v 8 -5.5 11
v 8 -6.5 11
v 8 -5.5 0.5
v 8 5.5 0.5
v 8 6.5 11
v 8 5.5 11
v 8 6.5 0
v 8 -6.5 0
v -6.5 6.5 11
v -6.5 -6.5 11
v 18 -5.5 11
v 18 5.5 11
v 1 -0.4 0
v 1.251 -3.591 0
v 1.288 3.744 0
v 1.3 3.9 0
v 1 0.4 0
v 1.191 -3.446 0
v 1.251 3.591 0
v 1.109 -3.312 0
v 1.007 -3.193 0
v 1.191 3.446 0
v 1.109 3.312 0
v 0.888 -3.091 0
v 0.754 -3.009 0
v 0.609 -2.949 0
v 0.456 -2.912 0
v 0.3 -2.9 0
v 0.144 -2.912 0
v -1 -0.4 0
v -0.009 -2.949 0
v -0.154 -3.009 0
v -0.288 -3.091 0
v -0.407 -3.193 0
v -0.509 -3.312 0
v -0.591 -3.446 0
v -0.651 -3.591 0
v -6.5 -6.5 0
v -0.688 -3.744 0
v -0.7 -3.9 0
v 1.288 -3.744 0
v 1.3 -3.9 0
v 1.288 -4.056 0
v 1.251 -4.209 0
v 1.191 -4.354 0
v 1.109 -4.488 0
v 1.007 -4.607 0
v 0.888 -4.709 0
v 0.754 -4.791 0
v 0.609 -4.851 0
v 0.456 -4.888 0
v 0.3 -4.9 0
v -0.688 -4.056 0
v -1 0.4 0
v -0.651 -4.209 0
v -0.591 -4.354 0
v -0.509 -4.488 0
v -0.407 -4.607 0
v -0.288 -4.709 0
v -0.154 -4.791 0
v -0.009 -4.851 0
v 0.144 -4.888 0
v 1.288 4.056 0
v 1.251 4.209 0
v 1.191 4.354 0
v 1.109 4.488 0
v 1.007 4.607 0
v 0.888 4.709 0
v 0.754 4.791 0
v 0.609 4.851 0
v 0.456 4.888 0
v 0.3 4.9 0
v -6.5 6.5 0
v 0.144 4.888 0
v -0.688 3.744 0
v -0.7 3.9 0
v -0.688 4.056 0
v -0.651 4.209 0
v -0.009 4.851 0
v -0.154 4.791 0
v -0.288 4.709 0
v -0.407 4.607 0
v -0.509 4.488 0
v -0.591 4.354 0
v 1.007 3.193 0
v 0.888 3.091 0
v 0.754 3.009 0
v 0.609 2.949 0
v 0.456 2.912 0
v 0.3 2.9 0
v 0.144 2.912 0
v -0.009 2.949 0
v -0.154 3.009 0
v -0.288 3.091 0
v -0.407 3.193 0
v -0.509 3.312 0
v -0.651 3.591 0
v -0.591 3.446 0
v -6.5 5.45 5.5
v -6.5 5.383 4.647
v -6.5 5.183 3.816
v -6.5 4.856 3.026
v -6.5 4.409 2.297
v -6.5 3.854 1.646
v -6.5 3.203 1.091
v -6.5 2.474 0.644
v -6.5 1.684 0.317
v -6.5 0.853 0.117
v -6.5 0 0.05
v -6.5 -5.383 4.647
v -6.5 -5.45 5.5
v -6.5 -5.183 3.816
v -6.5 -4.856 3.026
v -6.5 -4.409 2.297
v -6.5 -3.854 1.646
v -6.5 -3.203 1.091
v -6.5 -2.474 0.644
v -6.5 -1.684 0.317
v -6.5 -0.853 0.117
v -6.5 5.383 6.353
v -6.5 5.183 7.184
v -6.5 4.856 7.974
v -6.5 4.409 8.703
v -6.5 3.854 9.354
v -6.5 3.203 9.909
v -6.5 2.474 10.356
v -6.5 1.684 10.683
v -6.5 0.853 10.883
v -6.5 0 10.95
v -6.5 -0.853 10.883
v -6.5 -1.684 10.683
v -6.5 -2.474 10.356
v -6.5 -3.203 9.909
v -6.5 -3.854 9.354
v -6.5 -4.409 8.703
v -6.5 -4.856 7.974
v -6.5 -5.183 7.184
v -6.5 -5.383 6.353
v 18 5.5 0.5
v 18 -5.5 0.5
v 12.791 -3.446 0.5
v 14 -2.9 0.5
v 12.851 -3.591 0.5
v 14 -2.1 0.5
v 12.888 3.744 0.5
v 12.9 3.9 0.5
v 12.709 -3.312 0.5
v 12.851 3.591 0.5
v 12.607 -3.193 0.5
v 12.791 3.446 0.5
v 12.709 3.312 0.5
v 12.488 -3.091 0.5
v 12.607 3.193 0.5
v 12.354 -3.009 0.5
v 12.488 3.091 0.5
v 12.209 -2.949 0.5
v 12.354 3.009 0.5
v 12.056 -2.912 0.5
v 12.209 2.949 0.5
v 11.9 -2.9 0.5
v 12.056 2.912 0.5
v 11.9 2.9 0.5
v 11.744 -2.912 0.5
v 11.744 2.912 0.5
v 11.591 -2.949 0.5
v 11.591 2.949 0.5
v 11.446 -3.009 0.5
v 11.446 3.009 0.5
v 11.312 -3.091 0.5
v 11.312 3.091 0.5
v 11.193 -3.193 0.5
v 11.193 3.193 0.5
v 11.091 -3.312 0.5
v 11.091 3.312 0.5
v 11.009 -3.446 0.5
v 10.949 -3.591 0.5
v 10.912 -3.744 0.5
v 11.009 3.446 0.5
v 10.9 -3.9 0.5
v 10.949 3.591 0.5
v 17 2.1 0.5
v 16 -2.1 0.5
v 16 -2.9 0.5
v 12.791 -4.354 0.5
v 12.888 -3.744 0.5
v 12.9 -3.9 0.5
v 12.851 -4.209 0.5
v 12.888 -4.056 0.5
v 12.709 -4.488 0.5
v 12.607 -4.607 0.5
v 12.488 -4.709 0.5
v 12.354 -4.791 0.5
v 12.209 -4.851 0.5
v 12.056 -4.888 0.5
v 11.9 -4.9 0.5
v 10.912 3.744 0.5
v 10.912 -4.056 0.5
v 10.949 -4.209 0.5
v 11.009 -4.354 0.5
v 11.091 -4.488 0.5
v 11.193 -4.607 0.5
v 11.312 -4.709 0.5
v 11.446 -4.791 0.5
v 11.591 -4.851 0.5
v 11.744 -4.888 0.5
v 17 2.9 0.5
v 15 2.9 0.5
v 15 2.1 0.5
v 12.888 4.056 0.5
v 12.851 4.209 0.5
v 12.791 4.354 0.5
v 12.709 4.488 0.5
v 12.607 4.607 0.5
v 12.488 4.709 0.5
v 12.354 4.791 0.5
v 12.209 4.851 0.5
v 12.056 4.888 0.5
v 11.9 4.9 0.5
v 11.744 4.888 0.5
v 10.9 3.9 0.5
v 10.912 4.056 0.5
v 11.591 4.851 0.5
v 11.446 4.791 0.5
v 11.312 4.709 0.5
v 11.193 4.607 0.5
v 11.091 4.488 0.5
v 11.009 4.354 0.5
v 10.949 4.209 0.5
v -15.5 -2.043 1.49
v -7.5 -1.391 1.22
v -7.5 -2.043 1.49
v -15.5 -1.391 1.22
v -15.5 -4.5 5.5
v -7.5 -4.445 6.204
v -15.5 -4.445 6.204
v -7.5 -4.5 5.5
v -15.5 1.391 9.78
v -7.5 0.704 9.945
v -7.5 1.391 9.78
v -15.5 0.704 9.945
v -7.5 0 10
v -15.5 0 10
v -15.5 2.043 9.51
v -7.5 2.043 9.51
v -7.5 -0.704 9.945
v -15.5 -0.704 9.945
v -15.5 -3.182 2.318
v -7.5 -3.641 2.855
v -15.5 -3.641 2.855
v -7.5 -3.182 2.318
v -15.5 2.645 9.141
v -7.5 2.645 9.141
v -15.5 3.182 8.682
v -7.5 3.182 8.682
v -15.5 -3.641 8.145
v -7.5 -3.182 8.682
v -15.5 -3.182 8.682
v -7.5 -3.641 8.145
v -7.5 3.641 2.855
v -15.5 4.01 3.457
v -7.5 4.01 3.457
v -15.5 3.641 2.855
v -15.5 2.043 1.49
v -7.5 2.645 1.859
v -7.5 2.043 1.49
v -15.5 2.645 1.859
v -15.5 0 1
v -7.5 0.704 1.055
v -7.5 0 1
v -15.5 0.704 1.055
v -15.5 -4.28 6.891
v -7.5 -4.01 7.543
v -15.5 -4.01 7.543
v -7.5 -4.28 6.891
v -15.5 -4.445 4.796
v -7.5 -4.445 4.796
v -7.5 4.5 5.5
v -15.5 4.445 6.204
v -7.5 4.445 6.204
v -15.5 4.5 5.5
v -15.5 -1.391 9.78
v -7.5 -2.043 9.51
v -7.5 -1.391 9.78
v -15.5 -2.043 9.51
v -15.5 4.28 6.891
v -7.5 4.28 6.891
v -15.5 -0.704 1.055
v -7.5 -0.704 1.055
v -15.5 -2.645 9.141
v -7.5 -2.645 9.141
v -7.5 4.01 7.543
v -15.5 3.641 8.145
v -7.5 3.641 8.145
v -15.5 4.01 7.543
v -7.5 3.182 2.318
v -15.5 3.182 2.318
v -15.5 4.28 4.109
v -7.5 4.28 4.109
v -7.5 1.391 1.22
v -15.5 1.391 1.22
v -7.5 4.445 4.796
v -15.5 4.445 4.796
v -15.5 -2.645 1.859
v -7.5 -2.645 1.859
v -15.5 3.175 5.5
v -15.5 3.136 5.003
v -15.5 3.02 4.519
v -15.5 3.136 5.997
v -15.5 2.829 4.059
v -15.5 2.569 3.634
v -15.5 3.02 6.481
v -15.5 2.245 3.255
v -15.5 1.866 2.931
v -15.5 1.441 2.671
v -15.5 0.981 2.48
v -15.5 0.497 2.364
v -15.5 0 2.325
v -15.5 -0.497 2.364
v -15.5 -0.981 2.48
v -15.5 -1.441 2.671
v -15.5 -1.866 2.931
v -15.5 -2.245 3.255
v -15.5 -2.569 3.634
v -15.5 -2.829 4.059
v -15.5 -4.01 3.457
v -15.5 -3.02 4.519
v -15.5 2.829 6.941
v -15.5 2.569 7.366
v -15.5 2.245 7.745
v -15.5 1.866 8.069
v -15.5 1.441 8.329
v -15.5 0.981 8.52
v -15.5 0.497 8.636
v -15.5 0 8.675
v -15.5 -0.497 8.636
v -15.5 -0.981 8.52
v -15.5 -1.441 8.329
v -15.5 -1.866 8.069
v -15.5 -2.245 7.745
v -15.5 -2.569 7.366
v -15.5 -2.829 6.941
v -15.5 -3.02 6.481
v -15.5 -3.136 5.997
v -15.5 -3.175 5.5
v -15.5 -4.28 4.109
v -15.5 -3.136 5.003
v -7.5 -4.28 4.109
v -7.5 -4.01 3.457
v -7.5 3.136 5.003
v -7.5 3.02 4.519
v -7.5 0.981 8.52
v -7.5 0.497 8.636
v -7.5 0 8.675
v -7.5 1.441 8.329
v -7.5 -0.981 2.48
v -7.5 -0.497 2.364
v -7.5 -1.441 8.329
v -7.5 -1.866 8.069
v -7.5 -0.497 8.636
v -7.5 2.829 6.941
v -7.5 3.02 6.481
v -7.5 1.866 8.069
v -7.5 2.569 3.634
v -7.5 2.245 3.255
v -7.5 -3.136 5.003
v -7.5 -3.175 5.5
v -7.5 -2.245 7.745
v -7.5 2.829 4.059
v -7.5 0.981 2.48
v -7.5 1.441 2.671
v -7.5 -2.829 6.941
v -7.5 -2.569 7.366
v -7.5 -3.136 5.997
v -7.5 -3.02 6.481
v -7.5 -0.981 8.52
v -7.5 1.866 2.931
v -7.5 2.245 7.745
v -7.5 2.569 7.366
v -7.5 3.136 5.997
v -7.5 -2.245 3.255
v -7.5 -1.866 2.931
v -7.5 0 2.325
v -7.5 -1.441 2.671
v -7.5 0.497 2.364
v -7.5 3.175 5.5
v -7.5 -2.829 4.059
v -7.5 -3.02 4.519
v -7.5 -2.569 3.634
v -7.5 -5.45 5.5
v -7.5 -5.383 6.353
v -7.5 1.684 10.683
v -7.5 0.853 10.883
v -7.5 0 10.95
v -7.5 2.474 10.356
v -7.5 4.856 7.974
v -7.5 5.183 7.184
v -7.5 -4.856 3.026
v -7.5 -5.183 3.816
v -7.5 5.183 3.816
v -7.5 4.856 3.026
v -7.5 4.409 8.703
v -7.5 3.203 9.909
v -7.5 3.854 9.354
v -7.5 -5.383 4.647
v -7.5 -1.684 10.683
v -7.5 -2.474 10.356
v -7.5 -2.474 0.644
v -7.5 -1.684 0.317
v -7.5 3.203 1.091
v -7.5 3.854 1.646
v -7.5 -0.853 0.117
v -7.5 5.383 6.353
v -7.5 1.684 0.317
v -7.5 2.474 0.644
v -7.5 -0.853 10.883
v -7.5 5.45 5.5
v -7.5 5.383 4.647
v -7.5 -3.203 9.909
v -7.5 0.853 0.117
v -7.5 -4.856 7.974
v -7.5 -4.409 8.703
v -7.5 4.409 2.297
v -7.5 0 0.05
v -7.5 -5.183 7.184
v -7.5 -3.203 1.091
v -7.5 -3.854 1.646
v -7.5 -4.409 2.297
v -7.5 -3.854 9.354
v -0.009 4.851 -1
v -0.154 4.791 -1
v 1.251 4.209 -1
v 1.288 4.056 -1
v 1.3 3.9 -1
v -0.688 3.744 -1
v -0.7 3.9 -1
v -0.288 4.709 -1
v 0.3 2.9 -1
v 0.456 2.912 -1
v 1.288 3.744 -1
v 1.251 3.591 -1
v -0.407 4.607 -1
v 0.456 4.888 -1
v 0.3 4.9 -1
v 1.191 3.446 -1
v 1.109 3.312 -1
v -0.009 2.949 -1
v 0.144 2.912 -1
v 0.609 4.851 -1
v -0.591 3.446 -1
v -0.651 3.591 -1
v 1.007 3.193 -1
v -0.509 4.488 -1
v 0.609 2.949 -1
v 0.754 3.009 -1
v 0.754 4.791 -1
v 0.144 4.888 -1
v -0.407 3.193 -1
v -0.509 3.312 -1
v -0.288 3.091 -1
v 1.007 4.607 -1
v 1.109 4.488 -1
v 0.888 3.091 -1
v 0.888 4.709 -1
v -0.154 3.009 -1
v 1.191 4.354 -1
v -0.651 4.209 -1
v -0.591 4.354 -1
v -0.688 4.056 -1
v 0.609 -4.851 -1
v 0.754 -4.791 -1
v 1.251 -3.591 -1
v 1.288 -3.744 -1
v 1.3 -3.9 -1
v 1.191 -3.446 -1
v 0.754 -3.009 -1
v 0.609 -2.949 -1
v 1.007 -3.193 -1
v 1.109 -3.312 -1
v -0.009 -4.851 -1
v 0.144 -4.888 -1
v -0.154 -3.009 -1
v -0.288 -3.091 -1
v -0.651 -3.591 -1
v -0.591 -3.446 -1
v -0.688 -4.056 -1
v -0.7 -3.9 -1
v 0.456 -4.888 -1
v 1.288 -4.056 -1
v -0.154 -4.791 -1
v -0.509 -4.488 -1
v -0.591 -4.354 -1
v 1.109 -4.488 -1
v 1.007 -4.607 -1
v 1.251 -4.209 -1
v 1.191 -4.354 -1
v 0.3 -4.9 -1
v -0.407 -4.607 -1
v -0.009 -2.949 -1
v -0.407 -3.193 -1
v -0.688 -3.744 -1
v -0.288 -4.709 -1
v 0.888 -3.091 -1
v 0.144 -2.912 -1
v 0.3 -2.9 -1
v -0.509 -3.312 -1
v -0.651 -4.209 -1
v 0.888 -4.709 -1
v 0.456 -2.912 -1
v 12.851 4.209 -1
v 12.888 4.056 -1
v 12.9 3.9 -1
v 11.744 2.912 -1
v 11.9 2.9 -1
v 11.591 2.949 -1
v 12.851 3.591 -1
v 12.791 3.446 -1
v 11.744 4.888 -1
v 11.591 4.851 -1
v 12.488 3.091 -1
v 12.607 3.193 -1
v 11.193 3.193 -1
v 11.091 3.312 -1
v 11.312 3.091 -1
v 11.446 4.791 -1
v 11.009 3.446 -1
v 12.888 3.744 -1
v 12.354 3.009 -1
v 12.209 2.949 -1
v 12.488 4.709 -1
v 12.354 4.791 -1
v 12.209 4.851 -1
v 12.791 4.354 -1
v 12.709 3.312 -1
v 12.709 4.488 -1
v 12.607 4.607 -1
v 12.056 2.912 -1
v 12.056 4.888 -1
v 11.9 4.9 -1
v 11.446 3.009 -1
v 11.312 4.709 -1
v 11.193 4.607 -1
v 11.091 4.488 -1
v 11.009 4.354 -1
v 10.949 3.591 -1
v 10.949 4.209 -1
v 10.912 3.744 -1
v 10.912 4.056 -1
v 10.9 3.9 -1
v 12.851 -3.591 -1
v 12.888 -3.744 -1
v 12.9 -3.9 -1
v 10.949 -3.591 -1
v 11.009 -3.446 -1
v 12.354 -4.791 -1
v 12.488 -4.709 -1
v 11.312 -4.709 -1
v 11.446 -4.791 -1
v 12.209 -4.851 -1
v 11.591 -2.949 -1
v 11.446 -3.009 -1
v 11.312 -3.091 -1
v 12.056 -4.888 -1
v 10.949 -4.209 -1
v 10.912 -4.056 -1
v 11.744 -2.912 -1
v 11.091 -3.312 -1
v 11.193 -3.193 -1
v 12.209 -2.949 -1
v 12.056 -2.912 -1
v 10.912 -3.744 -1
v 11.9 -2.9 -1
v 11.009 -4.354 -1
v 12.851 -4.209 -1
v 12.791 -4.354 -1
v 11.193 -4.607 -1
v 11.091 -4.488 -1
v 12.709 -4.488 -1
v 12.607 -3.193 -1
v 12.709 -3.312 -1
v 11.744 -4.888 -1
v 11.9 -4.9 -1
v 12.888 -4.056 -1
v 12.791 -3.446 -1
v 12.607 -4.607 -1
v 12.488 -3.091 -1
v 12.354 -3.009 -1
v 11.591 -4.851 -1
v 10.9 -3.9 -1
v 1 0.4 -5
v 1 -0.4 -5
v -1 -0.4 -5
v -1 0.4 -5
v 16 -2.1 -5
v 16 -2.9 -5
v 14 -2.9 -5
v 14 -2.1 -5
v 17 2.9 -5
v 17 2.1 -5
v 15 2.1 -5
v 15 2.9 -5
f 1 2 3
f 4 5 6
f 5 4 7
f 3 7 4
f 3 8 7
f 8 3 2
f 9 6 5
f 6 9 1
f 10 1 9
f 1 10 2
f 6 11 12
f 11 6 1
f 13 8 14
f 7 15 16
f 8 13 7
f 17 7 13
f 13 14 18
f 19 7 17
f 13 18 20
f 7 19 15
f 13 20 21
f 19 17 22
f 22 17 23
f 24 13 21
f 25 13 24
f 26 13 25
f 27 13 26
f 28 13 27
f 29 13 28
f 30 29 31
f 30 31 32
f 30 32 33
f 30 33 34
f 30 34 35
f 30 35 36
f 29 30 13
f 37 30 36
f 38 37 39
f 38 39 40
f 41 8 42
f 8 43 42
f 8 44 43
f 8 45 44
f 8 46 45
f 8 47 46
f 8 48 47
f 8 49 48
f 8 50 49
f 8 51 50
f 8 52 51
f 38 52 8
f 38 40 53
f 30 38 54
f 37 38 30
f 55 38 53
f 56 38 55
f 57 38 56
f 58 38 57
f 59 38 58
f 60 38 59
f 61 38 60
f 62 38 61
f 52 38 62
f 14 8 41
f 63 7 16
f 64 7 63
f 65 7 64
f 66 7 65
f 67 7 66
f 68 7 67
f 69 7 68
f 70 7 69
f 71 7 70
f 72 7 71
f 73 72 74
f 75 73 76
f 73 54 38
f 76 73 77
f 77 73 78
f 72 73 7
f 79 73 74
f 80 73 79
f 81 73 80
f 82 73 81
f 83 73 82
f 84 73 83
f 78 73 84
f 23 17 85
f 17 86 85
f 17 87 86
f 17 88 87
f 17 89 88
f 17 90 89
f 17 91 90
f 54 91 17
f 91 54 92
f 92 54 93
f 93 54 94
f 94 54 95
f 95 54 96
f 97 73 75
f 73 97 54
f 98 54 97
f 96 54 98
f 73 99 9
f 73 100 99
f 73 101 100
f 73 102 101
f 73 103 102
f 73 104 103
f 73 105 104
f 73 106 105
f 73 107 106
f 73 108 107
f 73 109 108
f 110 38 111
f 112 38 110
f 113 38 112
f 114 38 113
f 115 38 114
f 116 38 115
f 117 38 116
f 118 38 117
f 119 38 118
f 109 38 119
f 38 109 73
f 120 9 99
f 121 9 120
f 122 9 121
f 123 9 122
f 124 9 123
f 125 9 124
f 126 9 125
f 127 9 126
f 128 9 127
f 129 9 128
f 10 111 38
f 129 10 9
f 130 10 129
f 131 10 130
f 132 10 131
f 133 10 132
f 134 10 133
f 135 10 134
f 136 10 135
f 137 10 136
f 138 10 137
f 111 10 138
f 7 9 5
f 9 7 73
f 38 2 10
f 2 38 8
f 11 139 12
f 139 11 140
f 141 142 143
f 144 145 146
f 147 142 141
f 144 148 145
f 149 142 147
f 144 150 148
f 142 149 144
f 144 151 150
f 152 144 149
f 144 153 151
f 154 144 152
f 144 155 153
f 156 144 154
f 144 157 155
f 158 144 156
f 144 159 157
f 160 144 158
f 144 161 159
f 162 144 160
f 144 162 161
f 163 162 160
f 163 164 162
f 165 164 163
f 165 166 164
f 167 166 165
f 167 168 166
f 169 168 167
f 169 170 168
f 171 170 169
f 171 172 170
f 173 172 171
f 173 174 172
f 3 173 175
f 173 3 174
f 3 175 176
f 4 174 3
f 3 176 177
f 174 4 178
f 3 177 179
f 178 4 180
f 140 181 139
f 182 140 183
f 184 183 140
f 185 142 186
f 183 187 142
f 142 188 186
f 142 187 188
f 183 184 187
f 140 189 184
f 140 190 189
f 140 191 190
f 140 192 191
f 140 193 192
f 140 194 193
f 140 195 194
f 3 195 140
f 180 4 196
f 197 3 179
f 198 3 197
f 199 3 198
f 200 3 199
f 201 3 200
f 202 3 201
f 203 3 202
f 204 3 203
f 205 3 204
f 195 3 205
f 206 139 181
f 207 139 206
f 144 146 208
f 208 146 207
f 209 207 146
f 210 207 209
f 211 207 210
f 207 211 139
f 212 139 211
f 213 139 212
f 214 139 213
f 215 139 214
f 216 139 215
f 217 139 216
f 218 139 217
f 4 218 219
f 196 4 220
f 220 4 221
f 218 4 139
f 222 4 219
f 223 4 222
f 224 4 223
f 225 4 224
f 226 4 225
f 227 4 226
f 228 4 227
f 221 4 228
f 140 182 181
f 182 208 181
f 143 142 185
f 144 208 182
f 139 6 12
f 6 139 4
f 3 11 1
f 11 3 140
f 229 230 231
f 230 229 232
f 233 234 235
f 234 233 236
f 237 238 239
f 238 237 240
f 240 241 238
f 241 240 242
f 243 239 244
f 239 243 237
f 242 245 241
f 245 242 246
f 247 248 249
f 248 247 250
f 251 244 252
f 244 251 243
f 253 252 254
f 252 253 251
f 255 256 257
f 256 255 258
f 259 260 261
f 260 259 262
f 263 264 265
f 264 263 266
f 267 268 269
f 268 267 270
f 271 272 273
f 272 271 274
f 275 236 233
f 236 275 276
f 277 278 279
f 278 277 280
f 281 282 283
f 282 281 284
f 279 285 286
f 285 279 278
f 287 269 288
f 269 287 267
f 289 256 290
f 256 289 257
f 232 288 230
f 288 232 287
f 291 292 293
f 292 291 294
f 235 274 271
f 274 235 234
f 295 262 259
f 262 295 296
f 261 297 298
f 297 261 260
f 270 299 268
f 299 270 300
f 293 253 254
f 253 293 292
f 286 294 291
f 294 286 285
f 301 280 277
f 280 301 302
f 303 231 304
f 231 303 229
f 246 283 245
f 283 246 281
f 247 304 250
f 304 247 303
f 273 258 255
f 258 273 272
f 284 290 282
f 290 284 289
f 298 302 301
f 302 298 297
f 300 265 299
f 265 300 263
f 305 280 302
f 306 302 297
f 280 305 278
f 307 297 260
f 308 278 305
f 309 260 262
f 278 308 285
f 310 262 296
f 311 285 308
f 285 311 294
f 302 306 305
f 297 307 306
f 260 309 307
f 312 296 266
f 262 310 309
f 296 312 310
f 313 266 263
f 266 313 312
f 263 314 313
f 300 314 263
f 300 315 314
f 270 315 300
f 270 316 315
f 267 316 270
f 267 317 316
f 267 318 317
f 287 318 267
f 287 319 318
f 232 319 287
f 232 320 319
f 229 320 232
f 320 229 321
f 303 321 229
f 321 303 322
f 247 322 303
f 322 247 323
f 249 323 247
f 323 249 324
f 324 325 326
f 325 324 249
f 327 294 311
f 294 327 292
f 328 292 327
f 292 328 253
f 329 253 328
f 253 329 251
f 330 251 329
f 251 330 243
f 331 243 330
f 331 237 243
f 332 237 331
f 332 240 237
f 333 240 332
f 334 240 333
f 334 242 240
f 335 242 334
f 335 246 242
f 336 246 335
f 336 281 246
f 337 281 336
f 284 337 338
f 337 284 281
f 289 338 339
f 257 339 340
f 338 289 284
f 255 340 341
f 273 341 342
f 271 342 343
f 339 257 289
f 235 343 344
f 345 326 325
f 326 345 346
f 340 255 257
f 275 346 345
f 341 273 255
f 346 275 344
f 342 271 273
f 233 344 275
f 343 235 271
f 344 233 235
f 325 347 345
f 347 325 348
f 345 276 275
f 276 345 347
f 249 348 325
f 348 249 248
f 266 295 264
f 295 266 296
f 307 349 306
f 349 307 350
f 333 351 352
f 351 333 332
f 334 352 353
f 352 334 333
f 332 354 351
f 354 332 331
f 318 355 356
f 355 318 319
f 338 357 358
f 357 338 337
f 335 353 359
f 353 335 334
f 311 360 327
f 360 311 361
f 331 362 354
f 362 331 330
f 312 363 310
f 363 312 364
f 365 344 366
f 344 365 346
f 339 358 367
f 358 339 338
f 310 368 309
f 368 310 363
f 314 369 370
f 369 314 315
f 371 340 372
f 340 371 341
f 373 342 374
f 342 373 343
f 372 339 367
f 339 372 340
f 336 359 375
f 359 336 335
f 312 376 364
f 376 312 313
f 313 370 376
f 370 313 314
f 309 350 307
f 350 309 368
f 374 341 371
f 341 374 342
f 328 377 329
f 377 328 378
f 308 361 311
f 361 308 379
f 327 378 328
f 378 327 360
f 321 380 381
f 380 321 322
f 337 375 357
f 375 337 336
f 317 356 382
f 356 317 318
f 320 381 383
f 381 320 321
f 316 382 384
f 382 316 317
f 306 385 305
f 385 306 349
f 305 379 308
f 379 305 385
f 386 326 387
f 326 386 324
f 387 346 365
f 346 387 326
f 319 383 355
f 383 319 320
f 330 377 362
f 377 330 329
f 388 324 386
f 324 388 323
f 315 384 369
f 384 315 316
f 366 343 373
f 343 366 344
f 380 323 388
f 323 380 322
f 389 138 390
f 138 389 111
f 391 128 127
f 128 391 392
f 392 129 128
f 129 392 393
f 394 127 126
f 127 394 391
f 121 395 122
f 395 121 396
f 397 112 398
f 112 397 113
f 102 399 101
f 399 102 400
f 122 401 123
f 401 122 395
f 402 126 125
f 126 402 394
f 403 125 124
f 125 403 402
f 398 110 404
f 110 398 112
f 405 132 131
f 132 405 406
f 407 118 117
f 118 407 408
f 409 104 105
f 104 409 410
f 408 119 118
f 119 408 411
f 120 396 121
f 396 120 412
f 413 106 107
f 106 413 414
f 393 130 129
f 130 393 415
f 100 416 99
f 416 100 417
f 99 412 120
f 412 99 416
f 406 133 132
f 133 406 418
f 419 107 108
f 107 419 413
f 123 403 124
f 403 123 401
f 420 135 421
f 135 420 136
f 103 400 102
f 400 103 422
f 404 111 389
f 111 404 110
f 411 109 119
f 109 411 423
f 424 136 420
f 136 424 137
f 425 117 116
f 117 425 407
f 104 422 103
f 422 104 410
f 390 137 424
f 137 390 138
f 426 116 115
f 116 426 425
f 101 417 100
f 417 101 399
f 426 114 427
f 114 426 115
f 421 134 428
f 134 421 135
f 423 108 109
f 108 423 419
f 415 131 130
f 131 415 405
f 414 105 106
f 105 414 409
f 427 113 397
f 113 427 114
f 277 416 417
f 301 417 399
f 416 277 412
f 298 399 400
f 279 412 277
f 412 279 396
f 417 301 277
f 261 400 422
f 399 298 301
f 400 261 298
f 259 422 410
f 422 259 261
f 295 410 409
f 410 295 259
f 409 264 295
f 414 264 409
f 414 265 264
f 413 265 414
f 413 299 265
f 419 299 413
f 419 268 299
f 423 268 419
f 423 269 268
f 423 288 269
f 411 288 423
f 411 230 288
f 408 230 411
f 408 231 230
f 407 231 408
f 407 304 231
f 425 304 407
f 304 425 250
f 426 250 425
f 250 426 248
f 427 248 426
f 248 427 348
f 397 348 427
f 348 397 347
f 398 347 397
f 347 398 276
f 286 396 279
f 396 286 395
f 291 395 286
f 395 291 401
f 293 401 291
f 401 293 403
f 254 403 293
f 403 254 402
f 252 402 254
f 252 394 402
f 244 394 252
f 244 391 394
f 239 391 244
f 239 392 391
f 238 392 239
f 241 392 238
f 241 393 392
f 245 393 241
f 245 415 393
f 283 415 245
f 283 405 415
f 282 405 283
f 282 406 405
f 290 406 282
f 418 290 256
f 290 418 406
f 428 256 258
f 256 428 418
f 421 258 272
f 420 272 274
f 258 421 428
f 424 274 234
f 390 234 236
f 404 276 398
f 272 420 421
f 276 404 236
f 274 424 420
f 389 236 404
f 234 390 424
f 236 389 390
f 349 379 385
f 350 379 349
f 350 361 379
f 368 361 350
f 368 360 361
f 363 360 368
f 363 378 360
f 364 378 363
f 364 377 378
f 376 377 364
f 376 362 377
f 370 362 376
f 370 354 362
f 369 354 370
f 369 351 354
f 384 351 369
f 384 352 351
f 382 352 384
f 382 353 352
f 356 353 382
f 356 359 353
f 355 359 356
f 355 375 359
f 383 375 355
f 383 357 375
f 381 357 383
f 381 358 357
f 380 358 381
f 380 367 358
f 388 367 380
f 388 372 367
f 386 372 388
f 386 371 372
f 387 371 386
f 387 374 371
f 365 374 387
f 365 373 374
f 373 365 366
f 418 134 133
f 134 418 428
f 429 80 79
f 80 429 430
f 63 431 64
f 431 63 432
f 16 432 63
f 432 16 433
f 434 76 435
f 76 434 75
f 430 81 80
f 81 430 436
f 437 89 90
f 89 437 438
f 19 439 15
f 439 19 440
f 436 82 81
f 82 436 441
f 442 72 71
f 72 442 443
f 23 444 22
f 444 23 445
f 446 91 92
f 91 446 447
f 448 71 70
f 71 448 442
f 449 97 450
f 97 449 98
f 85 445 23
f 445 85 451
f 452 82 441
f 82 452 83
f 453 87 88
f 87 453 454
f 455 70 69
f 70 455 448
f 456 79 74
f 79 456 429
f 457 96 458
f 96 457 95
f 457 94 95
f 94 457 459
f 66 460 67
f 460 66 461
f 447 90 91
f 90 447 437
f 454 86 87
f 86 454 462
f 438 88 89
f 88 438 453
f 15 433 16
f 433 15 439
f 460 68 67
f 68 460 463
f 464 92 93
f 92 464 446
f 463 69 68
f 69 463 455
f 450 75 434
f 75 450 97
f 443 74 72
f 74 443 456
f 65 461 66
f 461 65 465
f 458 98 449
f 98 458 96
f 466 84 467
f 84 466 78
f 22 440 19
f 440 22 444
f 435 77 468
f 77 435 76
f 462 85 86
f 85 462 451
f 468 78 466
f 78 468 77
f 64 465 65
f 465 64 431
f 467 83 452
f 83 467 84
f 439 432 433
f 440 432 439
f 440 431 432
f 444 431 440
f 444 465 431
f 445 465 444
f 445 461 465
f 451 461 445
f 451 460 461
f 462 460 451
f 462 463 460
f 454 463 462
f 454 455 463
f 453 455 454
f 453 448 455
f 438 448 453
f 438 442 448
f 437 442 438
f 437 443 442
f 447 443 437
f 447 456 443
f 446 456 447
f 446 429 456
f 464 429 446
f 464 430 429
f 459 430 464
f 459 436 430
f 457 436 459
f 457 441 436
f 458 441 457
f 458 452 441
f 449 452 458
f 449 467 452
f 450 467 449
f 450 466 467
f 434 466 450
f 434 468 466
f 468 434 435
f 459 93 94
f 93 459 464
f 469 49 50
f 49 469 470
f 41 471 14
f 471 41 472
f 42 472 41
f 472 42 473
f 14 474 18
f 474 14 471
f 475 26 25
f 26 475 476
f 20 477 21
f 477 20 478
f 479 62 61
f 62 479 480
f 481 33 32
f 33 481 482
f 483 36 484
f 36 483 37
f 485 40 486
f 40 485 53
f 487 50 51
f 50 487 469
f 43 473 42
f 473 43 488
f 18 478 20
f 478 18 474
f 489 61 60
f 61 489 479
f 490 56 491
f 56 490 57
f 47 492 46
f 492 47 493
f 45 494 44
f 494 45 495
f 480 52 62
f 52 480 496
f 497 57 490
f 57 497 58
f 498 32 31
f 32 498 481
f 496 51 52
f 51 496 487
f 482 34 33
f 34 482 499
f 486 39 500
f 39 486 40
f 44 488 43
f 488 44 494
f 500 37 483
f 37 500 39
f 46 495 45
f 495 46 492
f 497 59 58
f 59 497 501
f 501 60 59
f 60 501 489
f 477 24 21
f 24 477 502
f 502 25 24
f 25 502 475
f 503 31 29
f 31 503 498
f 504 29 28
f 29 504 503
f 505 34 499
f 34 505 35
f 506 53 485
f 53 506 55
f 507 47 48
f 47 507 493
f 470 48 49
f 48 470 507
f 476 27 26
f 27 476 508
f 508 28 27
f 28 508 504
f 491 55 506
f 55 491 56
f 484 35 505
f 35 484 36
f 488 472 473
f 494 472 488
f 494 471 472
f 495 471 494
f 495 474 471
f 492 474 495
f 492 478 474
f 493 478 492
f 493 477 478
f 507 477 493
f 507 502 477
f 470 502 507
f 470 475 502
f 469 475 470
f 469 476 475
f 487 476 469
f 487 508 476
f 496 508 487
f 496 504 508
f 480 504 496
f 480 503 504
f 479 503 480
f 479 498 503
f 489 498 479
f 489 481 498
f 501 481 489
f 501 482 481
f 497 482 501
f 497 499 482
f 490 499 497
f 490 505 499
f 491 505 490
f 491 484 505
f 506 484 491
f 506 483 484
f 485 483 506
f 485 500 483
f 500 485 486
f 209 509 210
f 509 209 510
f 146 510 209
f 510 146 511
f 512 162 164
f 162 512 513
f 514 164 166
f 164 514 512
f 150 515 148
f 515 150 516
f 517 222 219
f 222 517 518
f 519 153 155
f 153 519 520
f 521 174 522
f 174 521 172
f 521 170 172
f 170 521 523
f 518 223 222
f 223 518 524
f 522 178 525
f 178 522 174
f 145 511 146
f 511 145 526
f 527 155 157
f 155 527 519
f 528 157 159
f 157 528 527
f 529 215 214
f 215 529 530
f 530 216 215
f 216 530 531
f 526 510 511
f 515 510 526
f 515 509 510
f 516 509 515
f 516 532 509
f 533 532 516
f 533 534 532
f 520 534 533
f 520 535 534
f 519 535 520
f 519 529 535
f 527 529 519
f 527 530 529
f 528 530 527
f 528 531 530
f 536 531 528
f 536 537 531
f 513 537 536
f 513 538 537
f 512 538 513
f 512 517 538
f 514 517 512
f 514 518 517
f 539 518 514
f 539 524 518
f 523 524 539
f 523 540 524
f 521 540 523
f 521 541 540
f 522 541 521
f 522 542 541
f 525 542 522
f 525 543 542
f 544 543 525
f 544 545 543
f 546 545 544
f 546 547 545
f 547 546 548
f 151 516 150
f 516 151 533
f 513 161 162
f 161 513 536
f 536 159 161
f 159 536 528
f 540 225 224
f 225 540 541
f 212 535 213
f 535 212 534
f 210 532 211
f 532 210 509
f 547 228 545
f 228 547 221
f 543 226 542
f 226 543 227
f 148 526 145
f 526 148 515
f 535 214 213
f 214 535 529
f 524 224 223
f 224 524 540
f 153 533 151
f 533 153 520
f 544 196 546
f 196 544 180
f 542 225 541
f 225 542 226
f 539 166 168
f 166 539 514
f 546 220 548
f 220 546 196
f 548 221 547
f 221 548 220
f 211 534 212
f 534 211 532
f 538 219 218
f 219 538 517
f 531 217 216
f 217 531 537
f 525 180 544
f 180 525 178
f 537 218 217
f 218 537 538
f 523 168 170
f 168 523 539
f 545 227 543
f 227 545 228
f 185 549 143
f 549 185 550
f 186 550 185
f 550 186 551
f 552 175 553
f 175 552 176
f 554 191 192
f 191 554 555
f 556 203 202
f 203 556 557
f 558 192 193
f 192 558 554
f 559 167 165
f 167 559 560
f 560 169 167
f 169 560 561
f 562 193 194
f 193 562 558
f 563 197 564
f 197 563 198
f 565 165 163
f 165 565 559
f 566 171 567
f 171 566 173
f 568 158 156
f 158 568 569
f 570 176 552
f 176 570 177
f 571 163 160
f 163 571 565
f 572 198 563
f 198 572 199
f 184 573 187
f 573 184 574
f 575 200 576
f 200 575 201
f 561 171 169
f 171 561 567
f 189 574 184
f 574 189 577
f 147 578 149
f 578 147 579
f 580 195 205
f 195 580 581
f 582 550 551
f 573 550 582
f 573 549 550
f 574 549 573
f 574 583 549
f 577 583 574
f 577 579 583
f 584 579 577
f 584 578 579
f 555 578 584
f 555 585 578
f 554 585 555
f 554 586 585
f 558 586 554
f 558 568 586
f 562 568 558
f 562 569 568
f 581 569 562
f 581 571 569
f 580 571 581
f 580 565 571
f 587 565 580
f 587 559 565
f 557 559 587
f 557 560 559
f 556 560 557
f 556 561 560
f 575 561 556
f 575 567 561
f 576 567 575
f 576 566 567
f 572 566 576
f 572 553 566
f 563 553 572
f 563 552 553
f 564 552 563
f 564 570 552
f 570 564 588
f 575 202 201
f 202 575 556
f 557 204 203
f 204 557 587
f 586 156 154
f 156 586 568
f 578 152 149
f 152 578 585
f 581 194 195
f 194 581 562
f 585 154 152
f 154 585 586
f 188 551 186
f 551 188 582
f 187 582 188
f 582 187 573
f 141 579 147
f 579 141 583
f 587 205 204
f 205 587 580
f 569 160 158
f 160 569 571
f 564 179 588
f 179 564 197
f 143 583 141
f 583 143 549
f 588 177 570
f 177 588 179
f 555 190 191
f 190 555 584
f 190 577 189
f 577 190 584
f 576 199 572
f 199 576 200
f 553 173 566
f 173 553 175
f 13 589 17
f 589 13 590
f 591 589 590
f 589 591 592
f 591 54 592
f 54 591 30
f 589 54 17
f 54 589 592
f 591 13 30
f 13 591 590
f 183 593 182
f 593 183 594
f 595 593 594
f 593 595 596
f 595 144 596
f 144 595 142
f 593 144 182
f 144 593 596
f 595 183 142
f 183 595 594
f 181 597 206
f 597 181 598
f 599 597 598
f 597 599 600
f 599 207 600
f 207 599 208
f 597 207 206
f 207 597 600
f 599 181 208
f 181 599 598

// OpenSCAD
$fn=40;

black = [0.2,0.2,0.2];
silver = [0.75,0.75,0.75];

// The model is centered on the front pin
// as per the data sheet
pins = [ [0, 0], [15, -2.5], [16, 2.5]];

feet = [ [ 0.3,3.9], [ 0.3,-3.9],
	 [11.9,3.9], [11.9,-3.9] ];

module body()
{
    translate([-6.5,-6.5])
	cube([14.5,13,11]);
    translate([8,-5.5,0.5])
	cube([10,11,10.5]);
}

module barrel()
{
    difference() {
	cylinder(9, d=9);
	translate([0,0,-1])
	    cylinder(11, d=6.35);
    }

}

module jack()
{
    translate([-6.5,0,5.5]) rotate([0,-90,0]) {
	cylinder(1, d=10.9);
	barrel();
    }
}

color(black) body();
color(silver) jack();

// Feet or locating pins..
color(black) translate([0,0,-1]) for (pos = feet)
	translate(pos) cylinder(2, d=2);

// Pins
color(silver) for (pos = pins)
	translate(pos) translate([0,0,-2]) cube([2,0.8,6], center=true);
